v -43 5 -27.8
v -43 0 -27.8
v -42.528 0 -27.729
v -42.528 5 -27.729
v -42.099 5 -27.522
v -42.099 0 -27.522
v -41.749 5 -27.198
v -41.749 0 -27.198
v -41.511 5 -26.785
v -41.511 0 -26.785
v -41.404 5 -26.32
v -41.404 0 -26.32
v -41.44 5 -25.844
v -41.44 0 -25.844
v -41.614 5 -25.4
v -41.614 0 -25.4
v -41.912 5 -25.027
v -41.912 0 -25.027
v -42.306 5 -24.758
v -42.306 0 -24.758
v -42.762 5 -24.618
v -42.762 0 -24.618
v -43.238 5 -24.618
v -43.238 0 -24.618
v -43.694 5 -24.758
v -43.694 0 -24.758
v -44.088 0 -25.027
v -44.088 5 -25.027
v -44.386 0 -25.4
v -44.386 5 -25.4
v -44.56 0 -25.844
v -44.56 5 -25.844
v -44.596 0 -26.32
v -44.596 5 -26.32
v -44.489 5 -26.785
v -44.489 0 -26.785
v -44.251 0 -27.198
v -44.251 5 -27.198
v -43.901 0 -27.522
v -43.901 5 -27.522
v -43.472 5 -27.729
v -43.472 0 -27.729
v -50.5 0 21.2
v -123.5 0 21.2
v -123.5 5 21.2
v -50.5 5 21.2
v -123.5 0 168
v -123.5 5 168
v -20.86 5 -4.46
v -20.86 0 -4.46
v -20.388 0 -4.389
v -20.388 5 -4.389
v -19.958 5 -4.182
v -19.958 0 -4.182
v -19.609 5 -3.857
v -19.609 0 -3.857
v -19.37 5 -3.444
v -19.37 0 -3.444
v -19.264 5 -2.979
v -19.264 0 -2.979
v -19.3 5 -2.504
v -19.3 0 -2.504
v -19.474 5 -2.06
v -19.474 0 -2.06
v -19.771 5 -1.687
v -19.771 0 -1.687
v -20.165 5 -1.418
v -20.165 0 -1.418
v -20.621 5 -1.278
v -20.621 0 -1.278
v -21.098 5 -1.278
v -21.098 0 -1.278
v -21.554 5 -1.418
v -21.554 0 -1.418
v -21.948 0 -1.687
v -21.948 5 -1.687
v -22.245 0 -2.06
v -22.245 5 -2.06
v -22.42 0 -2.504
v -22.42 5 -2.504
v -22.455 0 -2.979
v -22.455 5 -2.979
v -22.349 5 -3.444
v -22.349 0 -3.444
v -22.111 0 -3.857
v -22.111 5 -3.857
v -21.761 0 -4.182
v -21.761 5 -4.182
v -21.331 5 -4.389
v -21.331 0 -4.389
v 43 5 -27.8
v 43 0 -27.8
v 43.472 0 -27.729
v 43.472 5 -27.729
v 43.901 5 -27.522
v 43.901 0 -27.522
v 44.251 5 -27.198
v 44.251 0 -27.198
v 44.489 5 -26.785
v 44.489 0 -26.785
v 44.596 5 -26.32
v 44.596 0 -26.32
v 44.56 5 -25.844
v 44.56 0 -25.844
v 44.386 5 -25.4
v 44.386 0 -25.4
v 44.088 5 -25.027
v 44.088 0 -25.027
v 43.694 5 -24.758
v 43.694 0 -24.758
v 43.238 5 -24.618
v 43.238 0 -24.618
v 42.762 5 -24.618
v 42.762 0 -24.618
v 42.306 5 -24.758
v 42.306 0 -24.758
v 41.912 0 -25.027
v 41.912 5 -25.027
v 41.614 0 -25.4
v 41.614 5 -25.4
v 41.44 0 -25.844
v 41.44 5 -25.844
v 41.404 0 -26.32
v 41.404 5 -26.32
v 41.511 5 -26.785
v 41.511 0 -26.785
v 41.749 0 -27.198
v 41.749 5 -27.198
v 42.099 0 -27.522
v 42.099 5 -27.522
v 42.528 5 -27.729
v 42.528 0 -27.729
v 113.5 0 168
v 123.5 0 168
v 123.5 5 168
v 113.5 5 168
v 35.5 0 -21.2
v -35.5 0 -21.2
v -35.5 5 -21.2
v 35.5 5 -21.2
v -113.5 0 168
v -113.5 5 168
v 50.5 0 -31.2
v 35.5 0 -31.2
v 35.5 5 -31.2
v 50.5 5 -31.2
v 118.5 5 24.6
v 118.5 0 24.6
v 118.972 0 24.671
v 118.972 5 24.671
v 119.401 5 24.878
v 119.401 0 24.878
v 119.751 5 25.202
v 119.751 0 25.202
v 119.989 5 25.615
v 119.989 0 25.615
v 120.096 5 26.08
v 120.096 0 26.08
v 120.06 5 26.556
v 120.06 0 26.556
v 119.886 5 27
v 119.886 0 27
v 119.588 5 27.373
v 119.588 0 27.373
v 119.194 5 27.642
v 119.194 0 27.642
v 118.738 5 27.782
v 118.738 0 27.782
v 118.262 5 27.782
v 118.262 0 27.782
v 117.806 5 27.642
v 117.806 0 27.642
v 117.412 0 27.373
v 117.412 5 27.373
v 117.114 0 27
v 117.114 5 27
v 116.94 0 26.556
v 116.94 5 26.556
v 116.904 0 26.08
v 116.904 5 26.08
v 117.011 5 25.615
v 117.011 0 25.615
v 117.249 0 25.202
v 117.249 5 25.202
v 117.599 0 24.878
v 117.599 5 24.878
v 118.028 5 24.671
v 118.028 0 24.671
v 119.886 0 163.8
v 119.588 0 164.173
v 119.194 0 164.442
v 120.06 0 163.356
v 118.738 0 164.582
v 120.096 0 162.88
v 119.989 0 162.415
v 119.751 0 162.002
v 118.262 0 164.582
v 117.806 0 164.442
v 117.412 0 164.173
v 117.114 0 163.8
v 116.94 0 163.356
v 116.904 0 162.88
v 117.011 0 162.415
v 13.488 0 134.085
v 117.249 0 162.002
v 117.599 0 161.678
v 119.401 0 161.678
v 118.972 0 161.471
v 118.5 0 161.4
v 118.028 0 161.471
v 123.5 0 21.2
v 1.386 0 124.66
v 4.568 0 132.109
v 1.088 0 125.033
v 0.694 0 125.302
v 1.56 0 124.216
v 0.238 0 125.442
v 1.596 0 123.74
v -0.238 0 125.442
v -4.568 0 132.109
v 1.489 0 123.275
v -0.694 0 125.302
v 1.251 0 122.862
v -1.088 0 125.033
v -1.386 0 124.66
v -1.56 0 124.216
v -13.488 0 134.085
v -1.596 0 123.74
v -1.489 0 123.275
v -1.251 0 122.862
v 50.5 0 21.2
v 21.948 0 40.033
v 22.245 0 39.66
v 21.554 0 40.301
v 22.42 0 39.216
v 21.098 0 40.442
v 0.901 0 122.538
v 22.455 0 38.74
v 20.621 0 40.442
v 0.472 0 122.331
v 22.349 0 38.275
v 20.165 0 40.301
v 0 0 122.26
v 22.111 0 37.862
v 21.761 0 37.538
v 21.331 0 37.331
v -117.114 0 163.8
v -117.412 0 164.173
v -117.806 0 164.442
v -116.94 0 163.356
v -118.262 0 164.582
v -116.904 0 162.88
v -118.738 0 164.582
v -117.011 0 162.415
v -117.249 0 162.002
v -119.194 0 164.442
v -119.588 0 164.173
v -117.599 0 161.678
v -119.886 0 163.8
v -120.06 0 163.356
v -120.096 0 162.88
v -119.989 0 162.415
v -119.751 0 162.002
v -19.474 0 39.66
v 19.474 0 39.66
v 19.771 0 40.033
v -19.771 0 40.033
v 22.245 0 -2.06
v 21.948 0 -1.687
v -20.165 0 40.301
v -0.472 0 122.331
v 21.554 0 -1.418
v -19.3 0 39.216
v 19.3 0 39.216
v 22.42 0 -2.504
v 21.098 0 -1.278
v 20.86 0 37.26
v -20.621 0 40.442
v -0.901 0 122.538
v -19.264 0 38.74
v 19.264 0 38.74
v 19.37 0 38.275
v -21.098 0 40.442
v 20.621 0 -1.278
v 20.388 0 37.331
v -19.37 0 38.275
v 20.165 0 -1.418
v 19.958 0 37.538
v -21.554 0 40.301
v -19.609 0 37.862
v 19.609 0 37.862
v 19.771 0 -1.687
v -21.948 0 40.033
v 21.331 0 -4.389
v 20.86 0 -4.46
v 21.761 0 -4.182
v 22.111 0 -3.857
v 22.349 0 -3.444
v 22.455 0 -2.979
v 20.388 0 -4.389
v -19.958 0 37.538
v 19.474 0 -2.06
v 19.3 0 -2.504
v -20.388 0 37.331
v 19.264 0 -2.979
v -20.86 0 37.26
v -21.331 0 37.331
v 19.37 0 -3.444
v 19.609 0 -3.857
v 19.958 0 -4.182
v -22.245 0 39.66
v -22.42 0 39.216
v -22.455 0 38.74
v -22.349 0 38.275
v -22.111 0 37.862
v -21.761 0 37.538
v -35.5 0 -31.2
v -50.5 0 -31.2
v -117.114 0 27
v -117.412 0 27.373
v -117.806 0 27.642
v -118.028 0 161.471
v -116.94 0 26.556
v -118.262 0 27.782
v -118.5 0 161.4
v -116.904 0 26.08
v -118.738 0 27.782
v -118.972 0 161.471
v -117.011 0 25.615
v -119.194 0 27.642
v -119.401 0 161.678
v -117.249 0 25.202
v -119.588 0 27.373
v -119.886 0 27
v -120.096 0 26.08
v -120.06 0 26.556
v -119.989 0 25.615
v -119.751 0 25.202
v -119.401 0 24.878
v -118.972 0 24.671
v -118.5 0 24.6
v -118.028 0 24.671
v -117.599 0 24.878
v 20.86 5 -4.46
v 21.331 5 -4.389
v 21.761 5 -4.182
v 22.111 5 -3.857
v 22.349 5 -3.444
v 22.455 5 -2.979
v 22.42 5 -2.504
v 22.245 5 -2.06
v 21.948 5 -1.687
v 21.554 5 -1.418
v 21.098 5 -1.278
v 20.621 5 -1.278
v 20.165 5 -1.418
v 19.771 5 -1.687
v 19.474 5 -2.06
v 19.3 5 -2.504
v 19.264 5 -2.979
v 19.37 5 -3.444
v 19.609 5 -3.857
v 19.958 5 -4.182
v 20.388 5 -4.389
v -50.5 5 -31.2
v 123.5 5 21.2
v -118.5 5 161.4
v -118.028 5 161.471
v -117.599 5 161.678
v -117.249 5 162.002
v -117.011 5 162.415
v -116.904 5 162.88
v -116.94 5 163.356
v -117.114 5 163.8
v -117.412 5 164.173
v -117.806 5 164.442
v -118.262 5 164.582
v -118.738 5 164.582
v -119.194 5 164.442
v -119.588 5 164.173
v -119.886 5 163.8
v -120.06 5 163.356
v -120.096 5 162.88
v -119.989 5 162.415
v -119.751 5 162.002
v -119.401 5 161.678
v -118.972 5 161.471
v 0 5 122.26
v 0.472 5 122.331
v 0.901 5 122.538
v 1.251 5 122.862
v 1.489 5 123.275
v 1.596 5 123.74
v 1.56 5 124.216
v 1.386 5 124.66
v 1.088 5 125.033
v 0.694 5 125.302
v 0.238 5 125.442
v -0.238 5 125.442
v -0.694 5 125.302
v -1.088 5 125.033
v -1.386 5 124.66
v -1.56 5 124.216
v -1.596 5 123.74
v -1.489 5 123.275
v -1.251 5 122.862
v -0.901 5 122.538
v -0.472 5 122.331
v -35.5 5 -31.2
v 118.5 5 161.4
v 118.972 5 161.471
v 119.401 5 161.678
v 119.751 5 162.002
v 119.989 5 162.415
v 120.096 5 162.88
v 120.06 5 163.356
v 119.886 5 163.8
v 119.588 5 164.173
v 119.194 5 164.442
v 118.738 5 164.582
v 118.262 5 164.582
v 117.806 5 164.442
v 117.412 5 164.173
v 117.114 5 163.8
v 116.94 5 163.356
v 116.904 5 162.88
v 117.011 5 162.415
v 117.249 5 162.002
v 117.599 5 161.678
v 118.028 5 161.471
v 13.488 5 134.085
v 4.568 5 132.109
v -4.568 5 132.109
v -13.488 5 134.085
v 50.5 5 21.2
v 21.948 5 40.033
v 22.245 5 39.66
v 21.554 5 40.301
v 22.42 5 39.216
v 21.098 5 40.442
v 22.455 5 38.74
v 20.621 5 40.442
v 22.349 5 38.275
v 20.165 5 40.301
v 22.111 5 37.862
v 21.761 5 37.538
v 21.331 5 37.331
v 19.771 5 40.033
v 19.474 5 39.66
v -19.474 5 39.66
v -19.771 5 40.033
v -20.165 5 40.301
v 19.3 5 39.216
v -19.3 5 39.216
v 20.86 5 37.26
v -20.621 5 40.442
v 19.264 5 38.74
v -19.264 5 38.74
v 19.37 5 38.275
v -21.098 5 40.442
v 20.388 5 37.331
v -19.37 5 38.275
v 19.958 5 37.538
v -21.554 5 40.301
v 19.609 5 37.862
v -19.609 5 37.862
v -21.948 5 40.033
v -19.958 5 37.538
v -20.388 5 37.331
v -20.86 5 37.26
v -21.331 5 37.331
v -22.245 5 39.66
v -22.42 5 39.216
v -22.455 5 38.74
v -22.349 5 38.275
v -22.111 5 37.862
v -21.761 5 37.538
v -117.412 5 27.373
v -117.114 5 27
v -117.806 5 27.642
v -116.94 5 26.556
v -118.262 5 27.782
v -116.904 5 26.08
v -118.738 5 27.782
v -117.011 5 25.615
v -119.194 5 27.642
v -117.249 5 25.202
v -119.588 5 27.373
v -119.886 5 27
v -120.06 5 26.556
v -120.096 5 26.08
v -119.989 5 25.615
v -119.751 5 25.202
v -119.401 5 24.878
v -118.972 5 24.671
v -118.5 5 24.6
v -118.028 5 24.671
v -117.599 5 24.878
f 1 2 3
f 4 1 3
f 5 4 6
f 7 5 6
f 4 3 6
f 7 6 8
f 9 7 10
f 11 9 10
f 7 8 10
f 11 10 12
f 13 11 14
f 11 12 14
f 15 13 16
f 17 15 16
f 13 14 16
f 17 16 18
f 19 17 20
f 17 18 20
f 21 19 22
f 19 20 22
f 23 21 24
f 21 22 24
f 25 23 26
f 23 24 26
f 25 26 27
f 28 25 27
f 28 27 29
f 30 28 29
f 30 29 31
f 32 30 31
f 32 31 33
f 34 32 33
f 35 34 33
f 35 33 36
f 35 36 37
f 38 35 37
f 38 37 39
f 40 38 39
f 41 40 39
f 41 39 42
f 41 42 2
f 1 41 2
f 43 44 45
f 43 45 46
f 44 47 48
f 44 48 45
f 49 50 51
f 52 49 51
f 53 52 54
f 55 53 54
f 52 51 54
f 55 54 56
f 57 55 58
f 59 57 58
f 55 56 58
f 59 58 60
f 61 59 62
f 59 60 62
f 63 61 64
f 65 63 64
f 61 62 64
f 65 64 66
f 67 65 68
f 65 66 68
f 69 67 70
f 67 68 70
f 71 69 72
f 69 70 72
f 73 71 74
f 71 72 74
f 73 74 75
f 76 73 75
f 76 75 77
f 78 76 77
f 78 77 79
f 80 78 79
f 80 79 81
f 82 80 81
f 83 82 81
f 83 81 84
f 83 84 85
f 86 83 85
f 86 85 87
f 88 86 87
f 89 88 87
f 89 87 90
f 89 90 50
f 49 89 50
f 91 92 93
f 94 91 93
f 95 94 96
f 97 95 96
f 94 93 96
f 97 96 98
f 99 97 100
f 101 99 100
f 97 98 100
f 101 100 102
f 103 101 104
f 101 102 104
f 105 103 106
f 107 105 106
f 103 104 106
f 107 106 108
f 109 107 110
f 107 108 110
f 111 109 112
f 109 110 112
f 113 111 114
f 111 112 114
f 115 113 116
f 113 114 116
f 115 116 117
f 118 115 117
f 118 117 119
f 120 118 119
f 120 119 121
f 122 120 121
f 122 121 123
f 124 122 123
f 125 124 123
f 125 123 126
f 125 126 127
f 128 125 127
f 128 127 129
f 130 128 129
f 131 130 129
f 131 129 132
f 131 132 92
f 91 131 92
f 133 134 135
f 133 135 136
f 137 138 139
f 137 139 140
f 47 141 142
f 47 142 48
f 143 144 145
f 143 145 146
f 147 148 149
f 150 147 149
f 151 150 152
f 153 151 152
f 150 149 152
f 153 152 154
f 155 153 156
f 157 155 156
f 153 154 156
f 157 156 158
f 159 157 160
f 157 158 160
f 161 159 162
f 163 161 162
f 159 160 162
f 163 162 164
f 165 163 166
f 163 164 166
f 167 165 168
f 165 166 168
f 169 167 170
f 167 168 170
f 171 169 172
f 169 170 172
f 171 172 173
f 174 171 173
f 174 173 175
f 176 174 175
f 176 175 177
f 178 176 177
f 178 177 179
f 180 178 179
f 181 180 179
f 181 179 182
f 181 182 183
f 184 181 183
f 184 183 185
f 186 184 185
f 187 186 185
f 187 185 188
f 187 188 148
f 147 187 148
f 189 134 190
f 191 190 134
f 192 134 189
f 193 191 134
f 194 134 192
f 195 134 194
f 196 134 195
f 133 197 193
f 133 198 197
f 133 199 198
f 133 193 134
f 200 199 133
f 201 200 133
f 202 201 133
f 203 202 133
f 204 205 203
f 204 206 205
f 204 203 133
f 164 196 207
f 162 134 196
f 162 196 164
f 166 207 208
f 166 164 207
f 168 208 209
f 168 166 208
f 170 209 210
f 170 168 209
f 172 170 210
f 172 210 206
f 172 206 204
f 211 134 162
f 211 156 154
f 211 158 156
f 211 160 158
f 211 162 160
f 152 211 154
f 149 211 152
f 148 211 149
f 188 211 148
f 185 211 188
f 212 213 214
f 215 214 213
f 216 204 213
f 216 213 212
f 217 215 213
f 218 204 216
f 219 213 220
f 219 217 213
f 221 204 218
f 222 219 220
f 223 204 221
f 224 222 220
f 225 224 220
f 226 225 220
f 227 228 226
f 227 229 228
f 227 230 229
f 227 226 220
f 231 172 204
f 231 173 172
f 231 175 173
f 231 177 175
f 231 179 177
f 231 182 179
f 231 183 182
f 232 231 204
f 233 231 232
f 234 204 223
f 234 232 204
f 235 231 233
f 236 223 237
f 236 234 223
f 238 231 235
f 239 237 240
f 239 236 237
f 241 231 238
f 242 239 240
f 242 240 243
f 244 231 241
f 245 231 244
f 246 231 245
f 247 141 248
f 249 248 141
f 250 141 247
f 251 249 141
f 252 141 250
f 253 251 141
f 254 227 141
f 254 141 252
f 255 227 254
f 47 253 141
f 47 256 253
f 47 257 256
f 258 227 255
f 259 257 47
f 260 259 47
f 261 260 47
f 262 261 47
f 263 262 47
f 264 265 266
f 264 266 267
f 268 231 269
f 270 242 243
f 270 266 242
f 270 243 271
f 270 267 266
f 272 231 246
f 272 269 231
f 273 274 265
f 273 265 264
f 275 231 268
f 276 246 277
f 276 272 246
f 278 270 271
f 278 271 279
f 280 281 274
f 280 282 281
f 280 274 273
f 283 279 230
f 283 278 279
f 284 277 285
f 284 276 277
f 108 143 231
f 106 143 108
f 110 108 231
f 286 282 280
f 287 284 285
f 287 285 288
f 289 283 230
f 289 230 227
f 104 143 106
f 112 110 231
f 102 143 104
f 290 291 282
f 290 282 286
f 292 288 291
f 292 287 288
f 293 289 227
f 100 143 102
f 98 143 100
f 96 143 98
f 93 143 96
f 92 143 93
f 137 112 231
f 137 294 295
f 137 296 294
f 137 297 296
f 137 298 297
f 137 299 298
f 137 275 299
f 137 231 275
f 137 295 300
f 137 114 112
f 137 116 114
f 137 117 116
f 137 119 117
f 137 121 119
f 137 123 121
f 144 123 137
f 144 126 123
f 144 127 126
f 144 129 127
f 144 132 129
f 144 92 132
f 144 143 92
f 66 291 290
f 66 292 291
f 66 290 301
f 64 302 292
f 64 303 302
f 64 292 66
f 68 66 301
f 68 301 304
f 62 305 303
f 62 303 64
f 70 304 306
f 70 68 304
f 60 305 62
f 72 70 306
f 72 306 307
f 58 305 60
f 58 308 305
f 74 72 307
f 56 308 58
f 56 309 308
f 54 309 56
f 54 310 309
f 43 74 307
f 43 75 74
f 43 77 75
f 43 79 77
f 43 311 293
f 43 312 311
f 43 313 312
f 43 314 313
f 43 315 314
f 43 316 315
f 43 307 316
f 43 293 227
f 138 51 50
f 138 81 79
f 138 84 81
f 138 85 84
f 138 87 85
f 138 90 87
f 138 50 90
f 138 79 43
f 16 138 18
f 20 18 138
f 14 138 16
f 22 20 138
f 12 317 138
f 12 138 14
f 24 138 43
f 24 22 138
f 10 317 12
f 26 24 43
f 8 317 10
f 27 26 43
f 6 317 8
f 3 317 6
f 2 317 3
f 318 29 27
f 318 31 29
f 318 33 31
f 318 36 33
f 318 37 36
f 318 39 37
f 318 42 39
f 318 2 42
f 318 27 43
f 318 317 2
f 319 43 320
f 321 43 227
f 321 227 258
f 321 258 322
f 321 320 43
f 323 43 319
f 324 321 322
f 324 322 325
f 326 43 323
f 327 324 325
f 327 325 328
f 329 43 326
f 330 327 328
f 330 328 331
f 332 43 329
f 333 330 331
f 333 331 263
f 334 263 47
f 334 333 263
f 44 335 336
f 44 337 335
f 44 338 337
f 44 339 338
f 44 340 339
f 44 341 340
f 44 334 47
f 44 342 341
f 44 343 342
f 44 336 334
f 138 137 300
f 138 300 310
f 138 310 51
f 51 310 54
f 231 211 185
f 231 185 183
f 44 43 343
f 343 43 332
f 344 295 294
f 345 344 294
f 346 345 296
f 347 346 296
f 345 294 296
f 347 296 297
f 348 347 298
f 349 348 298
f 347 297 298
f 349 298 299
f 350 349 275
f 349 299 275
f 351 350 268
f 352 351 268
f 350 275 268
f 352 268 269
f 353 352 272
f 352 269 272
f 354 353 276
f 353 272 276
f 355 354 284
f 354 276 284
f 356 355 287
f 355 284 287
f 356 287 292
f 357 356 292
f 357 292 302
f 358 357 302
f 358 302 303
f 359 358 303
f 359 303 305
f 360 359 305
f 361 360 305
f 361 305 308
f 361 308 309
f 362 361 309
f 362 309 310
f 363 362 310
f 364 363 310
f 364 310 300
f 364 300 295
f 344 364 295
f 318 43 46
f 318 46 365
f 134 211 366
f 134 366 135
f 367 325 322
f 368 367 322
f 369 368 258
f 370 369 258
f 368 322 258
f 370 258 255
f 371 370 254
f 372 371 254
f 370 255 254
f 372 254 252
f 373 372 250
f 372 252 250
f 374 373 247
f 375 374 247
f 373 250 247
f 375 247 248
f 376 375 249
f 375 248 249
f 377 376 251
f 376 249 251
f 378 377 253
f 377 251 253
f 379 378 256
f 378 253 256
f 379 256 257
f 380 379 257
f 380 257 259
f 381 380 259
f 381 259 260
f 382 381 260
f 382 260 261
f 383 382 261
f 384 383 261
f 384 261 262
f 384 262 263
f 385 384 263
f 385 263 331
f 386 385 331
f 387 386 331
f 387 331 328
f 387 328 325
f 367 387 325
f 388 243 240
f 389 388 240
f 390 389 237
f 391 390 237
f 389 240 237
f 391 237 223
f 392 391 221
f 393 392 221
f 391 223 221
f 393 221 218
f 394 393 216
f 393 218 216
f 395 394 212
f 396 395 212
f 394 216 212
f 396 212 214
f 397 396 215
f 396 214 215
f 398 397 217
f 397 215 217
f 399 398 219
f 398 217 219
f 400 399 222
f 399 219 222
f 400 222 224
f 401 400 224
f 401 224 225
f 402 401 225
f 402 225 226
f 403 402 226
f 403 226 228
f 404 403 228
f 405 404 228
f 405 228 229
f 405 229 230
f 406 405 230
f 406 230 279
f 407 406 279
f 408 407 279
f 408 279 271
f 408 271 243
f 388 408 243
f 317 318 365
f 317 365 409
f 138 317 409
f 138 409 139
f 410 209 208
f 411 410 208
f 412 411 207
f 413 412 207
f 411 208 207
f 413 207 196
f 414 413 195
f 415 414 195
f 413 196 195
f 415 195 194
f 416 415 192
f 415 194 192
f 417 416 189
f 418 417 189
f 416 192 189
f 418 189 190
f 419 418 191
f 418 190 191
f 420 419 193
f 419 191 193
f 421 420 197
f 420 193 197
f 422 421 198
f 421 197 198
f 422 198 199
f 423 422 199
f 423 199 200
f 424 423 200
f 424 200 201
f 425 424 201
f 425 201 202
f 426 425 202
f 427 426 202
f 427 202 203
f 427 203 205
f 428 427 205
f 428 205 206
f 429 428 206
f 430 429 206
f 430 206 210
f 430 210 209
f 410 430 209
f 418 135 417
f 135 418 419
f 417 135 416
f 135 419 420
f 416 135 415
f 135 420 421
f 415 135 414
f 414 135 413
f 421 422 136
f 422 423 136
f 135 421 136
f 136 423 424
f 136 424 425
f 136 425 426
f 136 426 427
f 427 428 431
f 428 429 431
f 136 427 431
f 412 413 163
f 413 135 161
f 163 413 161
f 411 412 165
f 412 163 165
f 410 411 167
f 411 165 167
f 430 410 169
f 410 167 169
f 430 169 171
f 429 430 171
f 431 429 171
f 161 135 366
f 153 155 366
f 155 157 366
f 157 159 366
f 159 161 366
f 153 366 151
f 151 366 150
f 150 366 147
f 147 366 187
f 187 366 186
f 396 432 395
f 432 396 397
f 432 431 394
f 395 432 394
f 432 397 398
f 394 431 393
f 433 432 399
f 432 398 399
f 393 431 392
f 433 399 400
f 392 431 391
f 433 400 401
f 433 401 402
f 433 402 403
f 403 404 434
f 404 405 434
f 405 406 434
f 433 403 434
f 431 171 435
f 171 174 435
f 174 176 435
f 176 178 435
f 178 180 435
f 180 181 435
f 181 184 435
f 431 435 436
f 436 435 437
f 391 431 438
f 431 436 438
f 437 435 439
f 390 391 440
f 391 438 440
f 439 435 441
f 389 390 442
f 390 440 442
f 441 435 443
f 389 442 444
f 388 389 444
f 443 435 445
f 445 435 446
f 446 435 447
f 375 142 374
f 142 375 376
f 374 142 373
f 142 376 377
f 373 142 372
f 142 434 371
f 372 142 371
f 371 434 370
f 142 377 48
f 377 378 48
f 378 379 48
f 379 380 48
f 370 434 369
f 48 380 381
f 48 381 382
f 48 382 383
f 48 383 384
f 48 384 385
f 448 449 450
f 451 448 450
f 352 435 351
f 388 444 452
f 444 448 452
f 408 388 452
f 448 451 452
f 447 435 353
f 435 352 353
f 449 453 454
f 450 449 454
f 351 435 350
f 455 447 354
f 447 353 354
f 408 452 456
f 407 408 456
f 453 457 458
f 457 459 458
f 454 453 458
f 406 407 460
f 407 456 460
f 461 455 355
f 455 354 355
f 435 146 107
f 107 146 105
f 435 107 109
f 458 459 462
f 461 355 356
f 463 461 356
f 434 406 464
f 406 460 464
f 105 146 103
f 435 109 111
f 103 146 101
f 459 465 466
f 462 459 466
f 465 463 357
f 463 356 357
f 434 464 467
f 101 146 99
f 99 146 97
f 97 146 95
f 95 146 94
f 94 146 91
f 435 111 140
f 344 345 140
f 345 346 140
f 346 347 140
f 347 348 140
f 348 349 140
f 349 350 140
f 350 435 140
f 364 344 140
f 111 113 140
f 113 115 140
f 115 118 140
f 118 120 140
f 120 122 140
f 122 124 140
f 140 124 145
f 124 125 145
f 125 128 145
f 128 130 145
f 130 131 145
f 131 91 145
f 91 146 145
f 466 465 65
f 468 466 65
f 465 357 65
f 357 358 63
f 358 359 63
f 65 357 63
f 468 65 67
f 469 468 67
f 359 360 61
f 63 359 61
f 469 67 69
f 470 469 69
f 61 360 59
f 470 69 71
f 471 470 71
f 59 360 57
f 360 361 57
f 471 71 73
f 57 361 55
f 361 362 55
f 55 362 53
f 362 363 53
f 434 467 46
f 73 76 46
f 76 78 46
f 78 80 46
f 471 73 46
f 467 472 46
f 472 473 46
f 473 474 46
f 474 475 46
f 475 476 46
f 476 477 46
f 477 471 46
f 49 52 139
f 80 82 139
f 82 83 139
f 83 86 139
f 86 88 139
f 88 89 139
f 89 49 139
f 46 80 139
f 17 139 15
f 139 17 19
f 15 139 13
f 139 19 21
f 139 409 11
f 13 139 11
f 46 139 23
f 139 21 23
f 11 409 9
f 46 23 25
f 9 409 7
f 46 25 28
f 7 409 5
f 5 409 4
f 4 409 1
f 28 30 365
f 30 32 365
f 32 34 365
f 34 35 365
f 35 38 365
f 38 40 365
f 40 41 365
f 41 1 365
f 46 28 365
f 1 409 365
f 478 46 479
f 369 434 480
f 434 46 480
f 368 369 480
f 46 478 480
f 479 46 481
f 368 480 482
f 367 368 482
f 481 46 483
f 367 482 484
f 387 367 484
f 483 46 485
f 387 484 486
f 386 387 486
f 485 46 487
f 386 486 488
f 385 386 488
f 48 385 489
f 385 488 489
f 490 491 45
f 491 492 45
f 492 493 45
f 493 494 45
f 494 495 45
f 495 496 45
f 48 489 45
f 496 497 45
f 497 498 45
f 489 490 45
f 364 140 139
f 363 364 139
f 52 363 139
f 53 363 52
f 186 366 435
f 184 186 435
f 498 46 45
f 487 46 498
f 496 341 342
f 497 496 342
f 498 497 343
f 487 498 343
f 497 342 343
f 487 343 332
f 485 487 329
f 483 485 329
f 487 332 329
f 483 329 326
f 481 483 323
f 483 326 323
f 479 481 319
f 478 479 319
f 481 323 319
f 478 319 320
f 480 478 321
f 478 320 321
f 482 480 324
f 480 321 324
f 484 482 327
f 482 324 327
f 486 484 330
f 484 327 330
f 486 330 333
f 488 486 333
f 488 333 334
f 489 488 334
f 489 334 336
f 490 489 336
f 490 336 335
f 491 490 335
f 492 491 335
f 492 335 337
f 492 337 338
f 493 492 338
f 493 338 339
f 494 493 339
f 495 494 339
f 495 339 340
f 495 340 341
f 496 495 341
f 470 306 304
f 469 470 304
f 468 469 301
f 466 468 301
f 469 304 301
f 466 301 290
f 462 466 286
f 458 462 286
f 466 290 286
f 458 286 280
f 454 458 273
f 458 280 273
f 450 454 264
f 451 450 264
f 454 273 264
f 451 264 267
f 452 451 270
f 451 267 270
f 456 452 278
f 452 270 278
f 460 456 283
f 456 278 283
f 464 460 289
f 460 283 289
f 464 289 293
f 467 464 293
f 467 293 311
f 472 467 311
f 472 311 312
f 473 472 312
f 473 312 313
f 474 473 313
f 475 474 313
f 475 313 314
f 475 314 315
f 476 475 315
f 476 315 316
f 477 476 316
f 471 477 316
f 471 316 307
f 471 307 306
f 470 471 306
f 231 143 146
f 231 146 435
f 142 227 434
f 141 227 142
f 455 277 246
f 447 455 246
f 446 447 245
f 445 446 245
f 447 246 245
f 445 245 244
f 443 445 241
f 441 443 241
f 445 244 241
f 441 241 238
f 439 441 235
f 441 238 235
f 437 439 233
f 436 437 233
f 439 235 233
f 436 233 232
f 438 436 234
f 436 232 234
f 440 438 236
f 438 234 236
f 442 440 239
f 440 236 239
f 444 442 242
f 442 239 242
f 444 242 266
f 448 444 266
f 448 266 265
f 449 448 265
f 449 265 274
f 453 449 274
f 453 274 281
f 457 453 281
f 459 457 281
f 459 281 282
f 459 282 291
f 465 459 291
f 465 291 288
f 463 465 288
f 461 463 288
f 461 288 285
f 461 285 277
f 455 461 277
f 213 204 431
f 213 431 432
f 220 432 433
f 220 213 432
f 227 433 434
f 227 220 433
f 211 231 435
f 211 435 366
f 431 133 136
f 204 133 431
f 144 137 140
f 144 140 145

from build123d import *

# Parameters (mm, degrees)
BOSS_EXTRU_1_DEPTH      = 5
ESQUISSE2_R             = 1.6
ENL_V_MAT_EXTRU_1_DEPTH = 209.56953277


with BuildPart() as part:
    # Esquisse1 → Boss.-Extru.1 (new body)
    with BuildSketch(Plane(origin=(0, 0, 0), x_dir=(1, 0, 0), z_dir=(0, 1, 0))):
        with BuildLine():
            Line((-50.5, 31.2), (-35.5, 31.2))
            Line((-35.5, 31.2), (-35.5, 21.2))
            Line((-35.5, 21.2), (35.5, 21.2))
            Line((35.5, 21.2), (35.5, 31.2))
            Line((35.5, 31.2), (50.5, 31.2))
            Line((50.5, 31.2), (50.5, -21.2))
            Line((50.5, -21.2), (123.5, -21.2))
            Line((123.5, -21.2), (123.5, -168))
            Line((123.5, -168), (113.5, -168))
            Line((113.5, -168), (13.488258165, -134.084795517))
            ThreePointArc((13.488258165, -134.084795517), (0, -131.86), (-13.488258165, -134.084795517))
            Line((-13.488258165, -134.084795517), (-113.5, -168))
            Line((-113.5, -168), (-123.5, -168))
            Line((-123.5, -168), (-123.5, -21.2))
            Line((-123.5, -21.2), (-50.5, -21.2))
            Line((-50.5, -21.2), (-50.5, 31.2))
        make_face()
    extrude(amount=BOSS_EXTRU_1_DEPTH)

    # Esquisse2 → Enlèv. mat.-Extru.1 (cut, through all)
    with BuildSketch(Plane.XZ):
        with Locations(Location((-118.5, 163, 0), (0, 0, 270))):
            Circle(ESQUISSE2_R)
        with Locations(Location((118.5, 163, 0), (0, 0, 270))):
            Circle(ESQUISSE2_R)
        with Locations(Location((118.5, 26.2, 0), (0, 0, 270))):
            Circle(ESQUISSE2_R)
        with Locations(Location((-118.5, 26.2, 0), (0, 0, 270))):
            Circle(ESQUISSE2_R)
        with Locations(Location((43, -26.2, 0), (0, 0, 270))):
            Circle(ESQUISSE2_R)
        with Locations(Location((-43, -26.2, 0), (0, 0, 270))):
            Circle(ESQUISSE2_R)
        with Locations(Location((20.859650045, 38.859650045, 0), (0, 0, 270))):
            Circle(ESQUISSE2_R)
        with Locations(Location((-20.859650045, 38.859650045, 0), (0, 0, 270))):
            Circle(ESQUISSE2_R)
        with Locations(Location((-20.859650045, -2.859650045, 0), (0, 0, 270))):
            Circle(ESQUISSE2_R)
        with Locations(Location((20.859650045, -2.859650045, 0), (0, 0, 270))):
            Circle(ESQUISSE2_R)
        with Locations(Location((0, 123.86, 0), (0, 0, 270))):
            Circle(ESQUISSE2_R)
    extrude(amount=-ENL_V_MAT_EXTRU_1_DEPTH, mode=Mode.SUBTRACT)


solid = part.part
